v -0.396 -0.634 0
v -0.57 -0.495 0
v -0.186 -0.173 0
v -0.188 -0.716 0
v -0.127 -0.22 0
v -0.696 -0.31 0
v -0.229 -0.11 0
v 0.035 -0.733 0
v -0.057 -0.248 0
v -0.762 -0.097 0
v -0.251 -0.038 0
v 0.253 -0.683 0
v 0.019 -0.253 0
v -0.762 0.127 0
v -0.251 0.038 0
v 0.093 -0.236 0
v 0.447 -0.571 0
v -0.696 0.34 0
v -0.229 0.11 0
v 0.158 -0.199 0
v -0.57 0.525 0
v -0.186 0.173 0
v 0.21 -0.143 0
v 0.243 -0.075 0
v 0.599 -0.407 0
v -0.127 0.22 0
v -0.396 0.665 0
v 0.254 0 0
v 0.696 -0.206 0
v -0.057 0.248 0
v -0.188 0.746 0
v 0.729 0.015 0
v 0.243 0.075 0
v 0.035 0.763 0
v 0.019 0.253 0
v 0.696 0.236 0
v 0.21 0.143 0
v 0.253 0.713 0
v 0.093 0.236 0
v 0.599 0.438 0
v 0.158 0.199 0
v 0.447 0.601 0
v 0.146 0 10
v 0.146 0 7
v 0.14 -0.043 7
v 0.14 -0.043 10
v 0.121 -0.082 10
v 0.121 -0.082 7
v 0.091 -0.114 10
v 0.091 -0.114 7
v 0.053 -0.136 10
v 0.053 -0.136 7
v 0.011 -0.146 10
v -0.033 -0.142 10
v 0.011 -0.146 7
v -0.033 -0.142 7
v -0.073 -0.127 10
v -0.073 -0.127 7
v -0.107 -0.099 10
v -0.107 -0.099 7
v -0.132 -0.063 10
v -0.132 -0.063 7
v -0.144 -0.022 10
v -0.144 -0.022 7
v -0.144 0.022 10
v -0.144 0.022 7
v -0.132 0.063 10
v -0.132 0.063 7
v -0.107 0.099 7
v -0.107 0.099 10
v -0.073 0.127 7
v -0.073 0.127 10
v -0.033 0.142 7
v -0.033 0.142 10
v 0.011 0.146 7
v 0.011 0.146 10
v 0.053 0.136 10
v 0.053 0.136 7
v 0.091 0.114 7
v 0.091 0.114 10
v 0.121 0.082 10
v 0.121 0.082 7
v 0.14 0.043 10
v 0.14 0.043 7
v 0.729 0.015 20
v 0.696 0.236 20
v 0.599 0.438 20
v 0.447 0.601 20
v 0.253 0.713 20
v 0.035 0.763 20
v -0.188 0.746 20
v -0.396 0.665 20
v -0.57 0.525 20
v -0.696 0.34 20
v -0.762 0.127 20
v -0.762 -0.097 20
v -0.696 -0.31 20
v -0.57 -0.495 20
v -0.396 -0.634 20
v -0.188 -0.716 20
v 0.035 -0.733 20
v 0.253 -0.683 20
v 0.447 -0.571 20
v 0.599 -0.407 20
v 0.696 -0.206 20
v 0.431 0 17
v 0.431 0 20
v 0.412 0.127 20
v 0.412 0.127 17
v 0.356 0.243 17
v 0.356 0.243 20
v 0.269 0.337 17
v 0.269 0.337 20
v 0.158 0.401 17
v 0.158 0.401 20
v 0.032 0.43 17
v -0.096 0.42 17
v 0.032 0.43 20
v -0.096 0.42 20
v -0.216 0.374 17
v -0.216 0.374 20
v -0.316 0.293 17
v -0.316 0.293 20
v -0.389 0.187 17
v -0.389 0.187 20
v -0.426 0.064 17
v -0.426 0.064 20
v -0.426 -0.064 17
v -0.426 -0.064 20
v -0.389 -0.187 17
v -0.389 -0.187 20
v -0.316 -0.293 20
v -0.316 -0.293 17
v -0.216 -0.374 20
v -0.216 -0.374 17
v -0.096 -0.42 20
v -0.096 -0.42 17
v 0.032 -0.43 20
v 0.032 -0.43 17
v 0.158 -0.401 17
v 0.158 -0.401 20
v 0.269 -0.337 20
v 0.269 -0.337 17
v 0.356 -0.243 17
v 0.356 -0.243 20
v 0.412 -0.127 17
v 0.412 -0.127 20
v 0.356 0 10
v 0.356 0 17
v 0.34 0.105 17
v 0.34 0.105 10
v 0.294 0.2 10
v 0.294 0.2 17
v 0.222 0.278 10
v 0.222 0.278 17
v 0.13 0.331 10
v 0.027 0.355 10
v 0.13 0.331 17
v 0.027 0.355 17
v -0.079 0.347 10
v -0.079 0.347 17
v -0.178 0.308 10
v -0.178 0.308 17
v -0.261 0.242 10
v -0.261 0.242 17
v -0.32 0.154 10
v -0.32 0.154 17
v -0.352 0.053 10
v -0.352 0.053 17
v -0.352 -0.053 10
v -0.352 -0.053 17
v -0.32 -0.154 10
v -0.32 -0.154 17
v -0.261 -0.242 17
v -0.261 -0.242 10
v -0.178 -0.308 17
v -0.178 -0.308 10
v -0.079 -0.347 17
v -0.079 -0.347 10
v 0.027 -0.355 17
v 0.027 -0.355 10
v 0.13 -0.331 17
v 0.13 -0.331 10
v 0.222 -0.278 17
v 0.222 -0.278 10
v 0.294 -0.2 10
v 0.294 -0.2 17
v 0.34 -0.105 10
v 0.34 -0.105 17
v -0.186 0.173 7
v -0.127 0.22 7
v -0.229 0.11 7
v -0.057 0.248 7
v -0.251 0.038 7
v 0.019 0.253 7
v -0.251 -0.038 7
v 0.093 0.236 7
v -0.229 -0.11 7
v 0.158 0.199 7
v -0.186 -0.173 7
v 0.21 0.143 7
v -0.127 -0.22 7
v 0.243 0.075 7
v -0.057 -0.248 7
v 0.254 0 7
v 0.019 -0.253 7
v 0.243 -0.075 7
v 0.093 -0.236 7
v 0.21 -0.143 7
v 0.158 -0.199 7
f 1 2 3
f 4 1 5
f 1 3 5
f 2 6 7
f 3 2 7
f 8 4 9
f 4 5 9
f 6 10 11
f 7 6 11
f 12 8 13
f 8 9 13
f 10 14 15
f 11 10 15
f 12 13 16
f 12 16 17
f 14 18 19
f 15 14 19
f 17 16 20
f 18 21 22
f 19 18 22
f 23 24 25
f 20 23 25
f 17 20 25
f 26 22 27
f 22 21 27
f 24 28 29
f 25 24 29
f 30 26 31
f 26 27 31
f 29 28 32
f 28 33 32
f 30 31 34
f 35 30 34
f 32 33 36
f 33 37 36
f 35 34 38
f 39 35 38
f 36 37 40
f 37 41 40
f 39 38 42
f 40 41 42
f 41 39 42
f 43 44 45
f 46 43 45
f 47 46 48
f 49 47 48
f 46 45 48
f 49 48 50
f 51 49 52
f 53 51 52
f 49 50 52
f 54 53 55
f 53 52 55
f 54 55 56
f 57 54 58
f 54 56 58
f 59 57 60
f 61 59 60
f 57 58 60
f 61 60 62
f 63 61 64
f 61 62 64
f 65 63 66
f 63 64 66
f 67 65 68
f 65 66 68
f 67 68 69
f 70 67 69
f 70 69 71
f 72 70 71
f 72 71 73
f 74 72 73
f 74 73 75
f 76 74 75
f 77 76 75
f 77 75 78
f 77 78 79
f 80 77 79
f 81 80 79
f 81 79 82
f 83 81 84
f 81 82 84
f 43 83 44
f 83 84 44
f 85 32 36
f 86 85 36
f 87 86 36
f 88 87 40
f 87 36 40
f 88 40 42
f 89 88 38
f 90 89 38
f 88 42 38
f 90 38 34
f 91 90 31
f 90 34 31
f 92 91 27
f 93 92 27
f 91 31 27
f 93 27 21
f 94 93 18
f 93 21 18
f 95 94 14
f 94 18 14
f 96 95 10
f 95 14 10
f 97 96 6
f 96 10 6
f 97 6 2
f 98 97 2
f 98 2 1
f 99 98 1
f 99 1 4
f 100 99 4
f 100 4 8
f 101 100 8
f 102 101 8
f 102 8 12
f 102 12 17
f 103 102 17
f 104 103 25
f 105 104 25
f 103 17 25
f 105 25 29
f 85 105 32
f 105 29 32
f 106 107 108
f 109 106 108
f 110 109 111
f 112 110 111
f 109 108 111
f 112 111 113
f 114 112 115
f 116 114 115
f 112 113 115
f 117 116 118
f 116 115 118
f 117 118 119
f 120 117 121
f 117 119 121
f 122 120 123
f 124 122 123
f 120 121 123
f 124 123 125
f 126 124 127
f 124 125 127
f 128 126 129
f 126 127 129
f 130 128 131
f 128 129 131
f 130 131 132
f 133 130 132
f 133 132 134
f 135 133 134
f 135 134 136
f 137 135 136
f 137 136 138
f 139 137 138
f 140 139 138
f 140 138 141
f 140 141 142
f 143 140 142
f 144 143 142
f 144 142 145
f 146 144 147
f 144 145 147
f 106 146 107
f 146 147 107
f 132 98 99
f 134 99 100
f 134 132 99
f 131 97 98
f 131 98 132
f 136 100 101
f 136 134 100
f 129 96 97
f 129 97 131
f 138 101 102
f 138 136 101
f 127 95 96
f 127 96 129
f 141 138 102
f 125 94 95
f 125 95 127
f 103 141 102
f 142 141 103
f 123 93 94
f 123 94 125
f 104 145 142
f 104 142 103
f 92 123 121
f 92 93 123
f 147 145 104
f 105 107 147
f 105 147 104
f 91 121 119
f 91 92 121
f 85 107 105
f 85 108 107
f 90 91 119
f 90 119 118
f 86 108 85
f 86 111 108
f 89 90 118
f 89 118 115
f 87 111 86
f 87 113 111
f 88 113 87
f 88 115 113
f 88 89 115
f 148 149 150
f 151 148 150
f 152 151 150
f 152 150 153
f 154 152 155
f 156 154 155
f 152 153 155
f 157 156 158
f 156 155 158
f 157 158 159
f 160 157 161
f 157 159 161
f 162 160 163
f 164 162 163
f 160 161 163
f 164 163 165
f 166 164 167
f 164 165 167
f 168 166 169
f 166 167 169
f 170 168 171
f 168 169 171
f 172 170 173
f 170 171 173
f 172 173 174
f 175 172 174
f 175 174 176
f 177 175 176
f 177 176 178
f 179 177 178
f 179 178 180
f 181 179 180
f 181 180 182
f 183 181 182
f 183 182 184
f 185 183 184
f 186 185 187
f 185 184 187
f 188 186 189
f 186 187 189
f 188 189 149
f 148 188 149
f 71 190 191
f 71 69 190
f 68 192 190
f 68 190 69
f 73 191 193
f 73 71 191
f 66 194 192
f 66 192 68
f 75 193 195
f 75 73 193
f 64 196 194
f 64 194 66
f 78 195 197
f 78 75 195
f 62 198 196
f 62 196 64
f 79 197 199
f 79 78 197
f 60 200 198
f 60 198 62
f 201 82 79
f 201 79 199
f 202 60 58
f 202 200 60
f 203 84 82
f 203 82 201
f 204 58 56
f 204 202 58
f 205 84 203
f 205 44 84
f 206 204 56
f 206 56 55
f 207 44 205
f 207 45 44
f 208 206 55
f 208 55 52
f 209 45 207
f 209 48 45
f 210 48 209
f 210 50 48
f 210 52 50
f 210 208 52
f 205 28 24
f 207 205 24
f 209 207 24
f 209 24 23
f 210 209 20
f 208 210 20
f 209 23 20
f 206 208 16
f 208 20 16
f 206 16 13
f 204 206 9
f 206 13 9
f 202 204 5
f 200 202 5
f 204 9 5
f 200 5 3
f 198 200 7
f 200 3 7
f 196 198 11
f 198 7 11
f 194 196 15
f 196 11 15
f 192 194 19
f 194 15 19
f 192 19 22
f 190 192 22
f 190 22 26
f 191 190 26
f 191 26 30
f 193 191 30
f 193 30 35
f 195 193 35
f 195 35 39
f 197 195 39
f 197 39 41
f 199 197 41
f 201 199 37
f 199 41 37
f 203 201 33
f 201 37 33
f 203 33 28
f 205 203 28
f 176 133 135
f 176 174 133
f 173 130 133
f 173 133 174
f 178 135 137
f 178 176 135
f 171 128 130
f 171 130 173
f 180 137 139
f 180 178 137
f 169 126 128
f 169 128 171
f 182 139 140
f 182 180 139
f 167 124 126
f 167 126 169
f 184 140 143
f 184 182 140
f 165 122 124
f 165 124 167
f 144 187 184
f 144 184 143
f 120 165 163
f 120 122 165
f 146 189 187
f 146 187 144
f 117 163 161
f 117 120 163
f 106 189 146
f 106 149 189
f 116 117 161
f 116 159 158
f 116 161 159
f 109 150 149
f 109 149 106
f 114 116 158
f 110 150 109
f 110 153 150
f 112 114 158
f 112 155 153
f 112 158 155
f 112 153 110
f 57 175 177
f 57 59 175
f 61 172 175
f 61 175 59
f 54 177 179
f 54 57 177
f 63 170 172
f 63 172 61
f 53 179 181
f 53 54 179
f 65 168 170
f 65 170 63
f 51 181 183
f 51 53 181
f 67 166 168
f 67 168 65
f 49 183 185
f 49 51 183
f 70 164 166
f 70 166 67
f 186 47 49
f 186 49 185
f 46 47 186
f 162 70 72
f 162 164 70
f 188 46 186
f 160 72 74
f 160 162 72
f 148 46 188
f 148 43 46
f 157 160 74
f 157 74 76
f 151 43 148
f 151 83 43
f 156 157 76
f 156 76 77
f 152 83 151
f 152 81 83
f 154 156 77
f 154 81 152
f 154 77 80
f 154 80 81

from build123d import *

# Parameters (mm, degrees)
F0_R     = 0.75
F1_DEPTH = 20
F2_R     = 0.4313
F3_DEPTH = 3
F4_R     = 0.3556
F5_DEPTH = 7
F6_R     = 0.254
F7_DEPTH = 7
F8_R     = 0.1461
F9_DEPTH = 3


with BuildPart() as f1:
    # F0 (on Top) → F1 (new body)
    with BuildSketch(Plane.XY):
        with Locations((-0.020624, 0.015056)):
            Circle(F0_R)
    extrude(amount=F1_DEPTH)

    # F2 (on face) → F3 (cut)
    with BuildSketch(Plane.XY.offset(20)):
        Circle(F2_R)
    extrude(amount=-F3_DEPTH, mode=Mode.SUBTRACT)

    # F4 (on face) → F5 (cut)
    with BuildSketch(Plane.XY.offset(17)):
        Circle(F4_R)
    extrude(amount=-F5_DEPTH, mode=Mode.SUBTRACT)

    # F6 (on face) → F7 (cut)
    with BuildSketch(Plane(origin=(0, 0, 0), x_dir=(1, 0, 0), z_dir=(0, 0, -1))):
        Circle(F6_R)
    extrude(amount=-F7_DEPTH, mode=Mode.SUBTRACT)

    # F8 (on face) → F9 (cut)
    with BuildSketch(Plane(origin=(0, 0, 7), x_dir=(1, 0, 0), z_dir=(0, 0, -1))):
        Circle(F8_R)
    extrude(amount=-F9_DEPTH, mode=Mode.SUBTRACT)


solid = f1.part
